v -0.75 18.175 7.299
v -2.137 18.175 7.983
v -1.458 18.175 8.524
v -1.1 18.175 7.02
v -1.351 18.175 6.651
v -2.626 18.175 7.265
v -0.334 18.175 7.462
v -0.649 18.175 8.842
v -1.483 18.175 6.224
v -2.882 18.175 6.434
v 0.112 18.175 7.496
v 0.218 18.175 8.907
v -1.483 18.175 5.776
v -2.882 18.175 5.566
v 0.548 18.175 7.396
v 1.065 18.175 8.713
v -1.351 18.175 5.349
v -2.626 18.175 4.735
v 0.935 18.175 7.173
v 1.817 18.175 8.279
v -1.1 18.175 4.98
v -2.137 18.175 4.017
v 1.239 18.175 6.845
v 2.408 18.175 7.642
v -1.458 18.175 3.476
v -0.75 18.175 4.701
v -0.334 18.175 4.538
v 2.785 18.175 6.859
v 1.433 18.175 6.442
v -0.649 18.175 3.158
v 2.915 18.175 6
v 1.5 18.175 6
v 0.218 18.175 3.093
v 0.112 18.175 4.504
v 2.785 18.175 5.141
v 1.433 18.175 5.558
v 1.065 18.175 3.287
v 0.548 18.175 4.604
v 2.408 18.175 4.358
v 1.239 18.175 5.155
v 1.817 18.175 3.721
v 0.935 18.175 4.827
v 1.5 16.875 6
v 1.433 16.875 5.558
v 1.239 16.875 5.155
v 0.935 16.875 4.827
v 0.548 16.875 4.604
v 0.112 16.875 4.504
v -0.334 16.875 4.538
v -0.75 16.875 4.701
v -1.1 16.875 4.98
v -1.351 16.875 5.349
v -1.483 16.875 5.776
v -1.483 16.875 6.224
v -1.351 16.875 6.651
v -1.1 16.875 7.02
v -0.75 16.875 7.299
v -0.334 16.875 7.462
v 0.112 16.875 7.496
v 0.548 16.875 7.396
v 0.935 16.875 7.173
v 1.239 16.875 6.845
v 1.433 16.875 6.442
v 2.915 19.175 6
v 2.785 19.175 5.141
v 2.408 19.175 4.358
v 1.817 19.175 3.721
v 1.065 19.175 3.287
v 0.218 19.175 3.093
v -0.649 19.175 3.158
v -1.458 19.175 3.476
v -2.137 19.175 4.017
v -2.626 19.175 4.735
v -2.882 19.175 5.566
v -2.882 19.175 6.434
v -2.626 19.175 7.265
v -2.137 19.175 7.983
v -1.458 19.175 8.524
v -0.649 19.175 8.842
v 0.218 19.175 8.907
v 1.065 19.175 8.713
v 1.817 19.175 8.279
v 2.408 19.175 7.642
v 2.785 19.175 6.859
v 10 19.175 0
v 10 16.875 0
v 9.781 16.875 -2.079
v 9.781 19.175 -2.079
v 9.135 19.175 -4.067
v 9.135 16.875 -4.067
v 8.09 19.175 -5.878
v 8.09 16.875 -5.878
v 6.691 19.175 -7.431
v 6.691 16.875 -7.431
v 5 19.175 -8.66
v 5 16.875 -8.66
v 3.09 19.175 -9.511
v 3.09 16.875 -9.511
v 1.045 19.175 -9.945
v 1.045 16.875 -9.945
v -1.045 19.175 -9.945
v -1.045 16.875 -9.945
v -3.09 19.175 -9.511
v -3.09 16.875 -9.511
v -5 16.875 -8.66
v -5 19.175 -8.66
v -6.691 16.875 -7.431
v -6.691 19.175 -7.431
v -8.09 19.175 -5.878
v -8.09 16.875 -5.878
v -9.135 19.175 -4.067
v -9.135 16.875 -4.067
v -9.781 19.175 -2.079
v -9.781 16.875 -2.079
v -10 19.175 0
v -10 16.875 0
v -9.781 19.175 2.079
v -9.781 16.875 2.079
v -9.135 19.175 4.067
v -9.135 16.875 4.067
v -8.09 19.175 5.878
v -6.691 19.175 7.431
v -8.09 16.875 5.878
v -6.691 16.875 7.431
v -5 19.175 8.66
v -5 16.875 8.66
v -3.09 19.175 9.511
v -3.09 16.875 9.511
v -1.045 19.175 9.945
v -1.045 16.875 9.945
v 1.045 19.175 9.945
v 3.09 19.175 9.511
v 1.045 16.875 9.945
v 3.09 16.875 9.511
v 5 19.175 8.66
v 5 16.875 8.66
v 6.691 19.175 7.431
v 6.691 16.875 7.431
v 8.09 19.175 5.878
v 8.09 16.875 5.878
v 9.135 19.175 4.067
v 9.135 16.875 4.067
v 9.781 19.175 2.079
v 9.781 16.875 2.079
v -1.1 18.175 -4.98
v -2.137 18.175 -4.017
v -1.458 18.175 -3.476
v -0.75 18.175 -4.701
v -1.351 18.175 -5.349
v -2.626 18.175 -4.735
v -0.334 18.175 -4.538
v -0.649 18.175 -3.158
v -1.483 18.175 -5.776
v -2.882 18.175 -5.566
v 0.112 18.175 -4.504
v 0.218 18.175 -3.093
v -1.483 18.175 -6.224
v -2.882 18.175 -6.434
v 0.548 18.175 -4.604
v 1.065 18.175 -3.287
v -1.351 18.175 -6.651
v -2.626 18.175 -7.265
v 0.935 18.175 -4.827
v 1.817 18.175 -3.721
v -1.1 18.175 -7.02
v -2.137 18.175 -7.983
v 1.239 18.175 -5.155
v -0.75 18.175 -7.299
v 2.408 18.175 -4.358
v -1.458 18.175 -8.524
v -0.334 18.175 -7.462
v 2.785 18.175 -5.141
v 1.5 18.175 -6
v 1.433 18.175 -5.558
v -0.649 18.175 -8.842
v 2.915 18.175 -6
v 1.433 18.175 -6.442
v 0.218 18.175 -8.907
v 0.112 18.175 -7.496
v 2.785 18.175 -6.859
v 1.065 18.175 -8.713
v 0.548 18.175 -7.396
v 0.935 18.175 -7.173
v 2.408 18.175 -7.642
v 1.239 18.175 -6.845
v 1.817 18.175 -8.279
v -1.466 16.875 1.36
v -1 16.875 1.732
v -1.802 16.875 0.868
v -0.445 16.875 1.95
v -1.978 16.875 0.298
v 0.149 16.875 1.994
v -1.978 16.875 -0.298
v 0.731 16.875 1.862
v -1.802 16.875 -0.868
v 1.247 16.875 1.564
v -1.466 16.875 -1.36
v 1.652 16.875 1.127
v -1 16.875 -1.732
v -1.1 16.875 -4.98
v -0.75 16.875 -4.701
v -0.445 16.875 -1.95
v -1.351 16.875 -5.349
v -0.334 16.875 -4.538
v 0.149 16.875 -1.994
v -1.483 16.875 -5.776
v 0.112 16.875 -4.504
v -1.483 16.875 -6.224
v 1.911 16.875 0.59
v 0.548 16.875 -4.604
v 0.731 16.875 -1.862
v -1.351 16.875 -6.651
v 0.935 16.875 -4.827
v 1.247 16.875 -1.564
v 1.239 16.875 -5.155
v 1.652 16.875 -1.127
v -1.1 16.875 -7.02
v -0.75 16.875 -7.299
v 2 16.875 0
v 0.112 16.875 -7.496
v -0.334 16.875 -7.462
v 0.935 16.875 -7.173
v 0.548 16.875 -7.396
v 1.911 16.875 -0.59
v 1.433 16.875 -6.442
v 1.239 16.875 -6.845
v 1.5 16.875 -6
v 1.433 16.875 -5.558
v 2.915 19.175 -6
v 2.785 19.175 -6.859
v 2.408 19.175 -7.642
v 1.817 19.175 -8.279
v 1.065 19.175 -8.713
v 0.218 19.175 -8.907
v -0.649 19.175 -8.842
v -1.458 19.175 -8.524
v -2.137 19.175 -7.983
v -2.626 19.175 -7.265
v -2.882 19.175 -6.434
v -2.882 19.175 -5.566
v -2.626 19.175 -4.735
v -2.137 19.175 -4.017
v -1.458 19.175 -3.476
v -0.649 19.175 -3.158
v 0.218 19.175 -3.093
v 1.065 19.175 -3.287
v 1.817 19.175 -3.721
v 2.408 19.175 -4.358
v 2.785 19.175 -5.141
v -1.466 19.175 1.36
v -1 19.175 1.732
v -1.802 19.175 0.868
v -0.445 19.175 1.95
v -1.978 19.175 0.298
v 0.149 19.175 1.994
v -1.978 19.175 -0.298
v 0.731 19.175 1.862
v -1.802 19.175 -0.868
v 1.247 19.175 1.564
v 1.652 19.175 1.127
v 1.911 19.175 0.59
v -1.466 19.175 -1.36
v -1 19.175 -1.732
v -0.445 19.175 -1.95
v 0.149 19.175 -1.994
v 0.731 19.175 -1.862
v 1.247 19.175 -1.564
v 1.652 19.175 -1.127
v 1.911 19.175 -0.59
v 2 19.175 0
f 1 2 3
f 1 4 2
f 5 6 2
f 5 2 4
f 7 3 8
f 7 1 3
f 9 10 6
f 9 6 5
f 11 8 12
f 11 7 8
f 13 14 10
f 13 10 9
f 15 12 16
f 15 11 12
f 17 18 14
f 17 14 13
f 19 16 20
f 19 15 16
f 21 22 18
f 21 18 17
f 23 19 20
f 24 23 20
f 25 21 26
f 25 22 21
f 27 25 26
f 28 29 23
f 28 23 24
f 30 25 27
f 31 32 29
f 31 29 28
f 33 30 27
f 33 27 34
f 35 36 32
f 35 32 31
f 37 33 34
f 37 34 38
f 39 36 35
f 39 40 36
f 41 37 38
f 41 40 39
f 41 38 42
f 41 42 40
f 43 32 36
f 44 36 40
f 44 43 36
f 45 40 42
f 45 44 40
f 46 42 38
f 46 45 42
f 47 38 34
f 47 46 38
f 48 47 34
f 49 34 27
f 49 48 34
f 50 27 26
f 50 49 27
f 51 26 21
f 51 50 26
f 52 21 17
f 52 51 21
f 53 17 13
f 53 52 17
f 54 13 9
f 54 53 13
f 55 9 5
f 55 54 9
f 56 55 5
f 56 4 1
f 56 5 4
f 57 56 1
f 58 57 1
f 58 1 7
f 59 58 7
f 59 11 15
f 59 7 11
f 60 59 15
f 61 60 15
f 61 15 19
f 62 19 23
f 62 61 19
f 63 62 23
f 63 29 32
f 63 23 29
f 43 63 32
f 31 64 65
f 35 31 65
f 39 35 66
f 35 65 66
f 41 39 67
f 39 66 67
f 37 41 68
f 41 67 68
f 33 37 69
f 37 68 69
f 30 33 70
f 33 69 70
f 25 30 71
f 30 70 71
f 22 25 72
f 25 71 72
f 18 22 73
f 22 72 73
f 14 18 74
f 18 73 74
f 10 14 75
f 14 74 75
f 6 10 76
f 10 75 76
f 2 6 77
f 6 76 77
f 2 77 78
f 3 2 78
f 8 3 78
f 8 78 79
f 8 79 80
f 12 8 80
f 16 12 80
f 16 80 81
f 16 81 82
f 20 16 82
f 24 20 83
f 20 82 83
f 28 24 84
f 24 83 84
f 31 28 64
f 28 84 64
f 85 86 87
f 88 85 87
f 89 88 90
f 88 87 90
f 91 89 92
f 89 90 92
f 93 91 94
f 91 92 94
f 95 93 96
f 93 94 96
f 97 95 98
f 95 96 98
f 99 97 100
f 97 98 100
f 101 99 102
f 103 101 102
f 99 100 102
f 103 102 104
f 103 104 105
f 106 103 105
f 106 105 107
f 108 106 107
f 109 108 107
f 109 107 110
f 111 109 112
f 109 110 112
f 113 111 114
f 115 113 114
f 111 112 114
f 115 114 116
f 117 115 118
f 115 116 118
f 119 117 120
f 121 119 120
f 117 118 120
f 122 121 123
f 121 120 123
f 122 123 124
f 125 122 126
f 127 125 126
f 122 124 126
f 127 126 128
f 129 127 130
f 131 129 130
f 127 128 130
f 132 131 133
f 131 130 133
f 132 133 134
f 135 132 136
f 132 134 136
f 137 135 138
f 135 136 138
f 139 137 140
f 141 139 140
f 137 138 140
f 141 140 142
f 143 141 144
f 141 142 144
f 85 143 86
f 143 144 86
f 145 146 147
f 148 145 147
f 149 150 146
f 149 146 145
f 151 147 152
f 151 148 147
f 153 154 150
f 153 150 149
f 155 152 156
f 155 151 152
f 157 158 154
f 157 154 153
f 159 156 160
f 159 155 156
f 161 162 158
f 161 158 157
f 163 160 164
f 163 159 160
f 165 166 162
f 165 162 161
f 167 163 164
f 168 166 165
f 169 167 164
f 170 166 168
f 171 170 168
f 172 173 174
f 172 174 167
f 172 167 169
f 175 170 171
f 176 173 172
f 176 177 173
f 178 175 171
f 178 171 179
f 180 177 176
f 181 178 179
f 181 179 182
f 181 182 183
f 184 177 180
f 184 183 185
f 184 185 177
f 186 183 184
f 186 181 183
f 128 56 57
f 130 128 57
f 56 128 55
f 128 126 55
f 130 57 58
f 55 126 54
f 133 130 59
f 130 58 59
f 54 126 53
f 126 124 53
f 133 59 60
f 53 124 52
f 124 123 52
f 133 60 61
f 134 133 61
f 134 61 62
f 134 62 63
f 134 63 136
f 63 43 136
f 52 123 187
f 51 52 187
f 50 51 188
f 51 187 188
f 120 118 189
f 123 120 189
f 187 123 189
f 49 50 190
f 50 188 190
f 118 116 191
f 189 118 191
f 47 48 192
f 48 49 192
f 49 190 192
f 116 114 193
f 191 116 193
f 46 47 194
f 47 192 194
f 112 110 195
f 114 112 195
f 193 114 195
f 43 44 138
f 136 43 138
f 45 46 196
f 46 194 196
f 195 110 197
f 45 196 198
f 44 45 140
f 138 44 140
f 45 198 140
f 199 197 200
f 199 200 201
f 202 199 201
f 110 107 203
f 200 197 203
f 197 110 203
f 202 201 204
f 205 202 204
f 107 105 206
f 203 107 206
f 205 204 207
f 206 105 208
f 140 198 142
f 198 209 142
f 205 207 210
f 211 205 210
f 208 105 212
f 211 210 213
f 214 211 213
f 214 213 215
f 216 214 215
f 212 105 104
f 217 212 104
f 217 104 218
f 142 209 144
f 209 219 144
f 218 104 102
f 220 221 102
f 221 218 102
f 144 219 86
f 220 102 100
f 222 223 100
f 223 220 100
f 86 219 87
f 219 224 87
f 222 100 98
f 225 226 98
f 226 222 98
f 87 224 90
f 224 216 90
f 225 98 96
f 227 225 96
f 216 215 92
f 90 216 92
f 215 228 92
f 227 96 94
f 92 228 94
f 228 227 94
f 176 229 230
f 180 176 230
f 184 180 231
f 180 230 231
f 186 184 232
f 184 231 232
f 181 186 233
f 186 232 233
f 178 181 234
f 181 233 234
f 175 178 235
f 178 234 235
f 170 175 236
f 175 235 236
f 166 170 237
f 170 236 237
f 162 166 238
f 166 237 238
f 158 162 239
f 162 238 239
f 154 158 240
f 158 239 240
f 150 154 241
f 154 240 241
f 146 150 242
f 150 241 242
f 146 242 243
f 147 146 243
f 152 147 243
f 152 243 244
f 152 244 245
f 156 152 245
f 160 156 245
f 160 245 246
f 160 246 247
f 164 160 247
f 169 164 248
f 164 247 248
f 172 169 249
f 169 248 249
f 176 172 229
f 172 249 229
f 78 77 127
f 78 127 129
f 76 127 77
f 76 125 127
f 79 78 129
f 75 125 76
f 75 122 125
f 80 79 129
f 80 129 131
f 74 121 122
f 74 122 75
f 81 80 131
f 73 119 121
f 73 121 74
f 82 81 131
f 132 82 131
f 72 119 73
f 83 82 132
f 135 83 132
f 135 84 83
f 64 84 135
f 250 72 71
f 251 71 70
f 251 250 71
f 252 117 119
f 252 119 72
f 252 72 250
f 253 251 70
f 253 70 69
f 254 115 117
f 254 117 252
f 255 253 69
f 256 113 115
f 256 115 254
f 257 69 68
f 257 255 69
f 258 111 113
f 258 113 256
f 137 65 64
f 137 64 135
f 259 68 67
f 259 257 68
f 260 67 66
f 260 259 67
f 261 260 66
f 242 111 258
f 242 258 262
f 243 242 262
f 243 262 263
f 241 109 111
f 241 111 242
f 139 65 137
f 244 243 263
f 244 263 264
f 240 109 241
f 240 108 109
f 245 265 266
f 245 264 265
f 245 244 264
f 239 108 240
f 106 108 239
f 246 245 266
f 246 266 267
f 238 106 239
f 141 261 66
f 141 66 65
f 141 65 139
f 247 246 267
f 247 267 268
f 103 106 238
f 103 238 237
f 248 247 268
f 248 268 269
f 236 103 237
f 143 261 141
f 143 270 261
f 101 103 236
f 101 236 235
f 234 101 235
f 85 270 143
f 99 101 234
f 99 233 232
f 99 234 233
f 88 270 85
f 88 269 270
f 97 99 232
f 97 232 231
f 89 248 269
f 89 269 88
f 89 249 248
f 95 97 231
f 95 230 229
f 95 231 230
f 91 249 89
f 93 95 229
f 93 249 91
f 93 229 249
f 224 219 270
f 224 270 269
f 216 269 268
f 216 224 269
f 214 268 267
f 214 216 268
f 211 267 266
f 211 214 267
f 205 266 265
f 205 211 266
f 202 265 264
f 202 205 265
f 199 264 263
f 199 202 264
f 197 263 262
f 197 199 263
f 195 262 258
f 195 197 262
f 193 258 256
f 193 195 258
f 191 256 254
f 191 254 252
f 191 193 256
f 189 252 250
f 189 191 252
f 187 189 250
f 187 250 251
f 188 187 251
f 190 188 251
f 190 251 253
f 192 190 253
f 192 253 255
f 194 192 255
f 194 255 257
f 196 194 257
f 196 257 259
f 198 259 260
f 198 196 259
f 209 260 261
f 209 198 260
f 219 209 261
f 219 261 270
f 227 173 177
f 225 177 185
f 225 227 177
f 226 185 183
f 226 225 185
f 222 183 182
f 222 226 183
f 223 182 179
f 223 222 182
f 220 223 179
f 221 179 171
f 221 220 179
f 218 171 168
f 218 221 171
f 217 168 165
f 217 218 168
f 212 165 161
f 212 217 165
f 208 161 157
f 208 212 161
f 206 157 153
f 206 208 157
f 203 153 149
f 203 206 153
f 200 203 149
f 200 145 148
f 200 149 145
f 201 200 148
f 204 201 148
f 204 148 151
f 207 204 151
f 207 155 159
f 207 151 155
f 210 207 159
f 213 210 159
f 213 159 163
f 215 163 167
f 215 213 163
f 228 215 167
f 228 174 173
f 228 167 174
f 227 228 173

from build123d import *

# Parameters (mm, degrees)
SKETCH1_R           = 10
SKETCH1_R_2         = 2
SKETCH1_R_3         = 1.5
BOSS_EXTRUDE1_DEPTH = 2.3
SKETCH2_R           = 2.915
CUT_EXTRUDE1_DEPTH  = 1


with BuildPart() as part:
    # Sketch1 → Boss-Extrude1 (new body)
    with BuildSketch(Plane(origin=(0, 16.875, 0), x_dir=(1, 0, 0), z_dir=(0, 1, 0))):
        Circle(SKETCH1_R)
        Circle(SKETCH1_R_2, mode=Mode.SUBTRACT)
        with Locations((0, 6)):
            Circle(SKETCH1_R_3, mode=Mode.SUBTRACT)
        with Locations((0, -6)):
            Circle(SKETCH1_R_3, mode=Mode.SUBTRACT)
    extrude(amount=BOSS_EXTRUDE1_DEPTH)

    # Sketch2 → Cut-Extrude1 (cut)
    with BuildSketch(Plane(origin=(0, 19.175, 0), x_dir=(1, 0, 0), z_dir=(0, 1, 0))):
        with Locations((0, 6)):
            Circle(SKETCH2_R)
        with Locations((0, -6)):
            Circle(SKETCH2_R)
    extrude(amount=-CUT_EXTRUDE1_DEPTH, mode=Mode.SUBTRACT)


solid = part.part
